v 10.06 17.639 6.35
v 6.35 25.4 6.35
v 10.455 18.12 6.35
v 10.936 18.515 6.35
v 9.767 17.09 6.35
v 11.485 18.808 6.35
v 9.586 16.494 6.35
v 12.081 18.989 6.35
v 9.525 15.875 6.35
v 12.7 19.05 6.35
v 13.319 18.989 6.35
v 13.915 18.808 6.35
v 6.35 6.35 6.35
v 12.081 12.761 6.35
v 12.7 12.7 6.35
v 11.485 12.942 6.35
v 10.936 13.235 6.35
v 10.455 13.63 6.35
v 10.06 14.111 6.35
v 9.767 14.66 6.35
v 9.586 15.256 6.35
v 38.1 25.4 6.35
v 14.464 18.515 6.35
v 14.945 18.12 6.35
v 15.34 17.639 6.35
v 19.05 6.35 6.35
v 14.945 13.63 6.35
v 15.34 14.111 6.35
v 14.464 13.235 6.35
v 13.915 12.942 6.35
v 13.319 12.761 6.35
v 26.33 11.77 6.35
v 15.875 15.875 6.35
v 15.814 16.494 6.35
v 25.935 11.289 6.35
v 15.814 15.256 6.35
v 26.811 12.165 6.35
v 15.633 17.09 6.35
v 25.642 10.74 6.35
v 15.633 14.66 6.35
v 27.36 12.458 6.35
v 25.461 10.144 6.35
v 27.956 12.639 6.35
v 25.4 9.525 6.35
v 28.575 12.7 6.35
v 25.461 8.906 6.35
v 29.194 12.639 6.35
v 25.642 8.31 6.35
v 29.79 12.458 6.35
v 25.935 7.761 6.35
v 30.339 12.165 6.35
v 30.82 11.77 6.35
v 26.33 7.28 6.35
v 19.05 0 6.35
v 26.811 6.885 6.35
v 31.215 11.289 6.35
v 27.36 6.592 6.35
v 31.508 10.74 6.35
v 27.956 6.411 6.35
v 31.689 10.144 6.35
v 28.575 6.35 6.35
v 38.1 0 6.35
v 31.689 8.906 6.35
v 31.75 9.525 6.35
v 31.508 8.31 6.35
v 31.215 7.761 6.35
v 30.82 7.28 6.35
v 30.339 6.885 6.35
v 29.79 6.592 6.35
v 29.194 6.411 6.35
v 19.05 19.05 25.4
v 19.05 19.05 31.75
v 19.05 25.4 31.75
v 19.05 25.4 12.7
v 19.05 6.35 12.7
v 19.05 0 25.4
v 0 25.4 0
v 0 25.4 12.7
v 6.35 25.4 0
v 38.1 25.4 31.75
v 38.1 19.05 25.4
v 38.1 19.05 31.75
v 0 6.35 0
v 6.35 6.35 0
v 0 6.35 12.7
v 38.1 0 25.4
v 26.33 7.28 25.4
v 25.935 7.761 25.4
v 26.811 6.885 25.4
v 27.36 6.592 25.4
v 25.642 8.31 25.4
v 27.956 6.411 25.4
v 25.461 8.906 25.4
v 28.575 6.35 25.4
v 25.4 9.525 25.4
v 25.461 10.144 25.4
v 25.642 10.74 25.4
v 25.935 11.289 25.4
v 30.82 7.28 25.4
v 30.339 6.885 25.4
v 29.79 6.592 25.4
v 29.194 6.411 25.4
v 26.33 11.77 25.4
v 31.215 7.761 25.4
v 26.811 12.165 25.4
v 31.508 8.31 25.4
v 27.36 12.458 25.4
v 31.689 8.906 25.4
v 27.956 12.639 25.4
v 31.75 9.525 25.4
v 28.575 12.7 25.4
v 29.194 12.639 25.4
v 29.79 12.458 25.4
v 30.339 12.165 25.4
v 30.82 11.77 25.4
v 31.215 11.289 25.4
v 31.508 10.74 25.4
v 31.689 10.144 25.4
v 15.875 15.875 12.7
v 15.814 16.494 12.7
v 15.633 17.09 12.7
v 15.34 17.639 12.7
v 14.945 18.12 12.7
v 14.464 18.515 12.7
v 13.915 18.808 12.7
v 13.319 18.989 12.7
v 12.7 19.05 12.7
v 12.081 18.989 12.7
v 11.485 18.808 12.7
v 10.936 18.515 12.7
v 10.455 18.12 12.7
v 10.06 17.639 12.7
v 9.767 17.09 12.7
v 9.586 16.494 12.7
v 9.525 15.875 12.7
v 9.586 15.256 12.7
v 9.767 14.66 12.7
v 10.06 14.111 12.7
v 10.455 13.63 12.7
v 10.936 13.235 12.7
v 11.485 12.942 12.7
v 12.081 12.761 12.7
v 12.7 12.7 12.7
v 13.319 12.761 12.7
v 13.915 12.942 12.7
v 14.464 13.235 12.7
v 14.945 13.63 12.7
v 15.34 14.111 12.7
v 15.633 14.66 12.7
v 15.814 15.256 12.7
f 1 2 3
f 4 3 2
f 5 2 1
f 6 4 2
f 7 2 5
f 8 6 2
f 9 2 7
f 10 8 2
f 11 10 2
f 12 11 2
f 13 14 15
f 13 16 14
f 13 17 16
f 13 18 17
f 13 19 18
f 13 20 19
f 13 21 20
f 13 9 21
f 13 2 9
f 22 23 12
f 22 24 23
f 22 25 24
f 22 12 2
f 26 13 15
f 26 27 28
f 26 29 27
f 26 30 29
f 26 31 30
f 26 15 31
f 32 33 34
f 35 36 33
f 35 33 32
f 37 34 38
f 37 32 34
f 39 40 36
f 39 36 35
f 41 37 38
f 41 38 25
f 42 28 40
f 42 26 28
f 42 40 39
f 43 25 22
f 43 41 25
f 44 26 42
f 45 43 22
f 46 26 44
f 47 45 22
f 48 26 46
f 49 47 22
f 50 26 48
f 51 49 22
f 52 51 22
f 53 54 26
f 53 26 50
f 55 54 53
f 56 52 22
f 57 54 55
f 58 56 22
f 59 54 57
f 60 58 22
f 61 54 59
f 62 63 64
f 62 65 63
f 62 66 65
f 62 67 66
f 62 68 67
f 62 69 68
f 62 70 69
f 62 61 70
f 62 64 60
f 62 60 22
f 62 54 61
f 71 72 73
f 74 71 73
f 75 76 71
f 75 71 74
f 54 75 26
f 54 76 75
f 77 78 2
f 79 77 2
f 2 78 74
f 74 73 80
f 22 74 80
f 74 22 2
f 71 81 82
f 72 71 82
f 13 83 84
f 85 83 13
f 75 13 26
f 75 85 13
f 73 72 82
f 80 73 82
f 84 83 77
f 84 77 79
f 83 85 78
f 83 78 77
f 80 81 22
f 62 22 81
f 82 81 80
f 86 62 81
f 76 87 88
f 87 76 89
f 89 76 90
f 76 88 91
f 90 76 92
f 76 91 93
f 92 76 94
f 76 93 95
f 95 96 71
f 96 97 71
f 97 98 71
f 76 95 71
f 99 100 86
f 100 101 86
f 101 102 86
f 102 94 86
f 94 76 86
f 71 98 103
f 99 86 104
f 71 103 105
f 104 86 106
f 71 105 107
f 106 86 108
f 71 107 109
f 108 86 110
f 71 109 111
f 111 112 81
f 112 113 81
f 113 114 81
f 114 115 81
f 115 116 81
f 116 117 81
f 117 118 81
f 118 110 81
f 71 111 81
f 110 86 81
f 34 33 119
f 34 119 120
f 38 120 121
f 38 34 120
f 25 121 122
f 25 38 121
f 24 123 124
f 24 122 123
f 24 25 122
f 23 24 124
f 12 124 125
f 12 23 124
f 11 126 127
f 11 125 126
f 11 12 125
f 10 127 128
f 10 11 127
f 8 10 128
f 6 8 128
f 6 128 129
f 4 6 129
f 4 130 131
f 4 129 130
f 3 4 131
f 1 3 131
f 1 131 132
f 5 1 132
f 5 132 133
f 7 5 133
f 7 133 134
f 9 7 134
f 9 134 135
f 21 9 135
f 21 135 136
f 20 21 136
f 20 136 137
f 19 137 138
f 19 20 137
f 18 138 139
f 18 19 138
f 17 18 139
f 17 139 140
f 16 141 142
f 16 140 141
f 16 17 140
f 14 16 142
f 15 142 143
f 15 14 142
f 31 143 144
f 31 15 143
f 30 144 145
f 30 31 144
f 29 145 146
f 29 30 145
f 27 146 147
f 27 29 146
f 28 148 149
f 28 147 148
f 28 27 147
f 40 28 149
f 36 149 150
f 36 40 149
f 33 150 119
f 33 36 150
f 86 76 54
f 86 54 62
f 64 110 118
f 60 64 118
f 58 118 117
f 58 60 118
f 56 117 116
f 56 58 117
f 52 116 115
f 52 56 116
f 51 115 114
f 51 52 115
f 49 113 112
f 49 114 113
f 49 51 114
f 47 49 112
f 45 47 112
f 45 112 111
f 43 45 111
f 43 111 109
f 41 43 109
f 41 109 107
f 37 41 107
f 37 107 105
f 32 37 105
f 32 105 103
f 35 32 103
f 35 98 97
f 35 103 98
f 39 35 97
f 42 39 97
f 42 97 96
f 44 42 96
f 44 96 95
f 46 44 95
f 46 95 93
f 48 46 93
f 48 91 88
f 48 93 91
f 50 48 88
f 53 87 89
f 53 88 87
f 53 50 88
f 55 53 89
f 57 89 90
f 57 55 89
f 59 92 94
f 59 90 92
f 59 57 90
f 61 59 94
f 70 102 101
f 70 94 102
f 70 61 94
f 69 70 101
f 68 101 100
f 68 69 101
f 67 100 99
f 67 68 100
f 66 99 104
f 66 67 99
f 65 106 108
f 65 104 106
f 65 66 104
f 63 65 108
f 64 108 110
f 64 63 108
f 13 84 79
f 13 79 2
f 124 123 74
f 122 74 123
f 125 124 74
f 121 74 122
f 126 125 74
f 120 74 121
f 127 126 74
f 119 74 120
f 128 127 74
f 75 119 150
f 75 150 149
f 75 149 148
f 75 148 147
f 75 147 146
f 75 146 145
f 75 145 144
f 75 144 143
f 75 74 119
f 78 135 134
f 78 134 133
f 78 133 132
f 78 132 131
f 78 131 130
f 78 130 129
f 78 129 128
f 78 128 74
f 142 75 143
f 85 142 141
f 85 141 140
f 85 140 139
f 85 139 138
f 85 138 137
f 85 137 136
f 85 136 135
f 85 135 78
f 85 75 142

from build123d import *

# Parameters (mm, degrees)
F0_W     = 19.05
F0_H     = 6.35
F1_DEPTH = 25.4
F2_START = -6.35
F2_DEPTH = 19.05
F4_W     = 19.05
F4_H     = 6.35
F5_DEPTH = 38.101
F6_R     = 3.175
F7_DEPTH = 31.751


with BuildPart() as f1:
    # F0 (on Front) → F1 (new body)
    with BuildSketch(Plane.XZ):
        with Locations((28.575, 28.575)):
            Rectangle(F0_W, F0_H)
        Polygon((19.05, 25.4), (19.05, 12.7), (19.05, 6.35), (38.1, 6.35), (38.1, 25.4), align=None)
    extrude(amount=-F1_DEPTH)

    # F0 (on Front) → F2 (join)
    with BuildSketch(Plane.XZ.offset(F2_START)):
        Polygon((0, 12.7), (0, 0), (6.35, 0), (6.35, 6.35), (19.05, 6.35), (19.05, 12.7), align=None)
    extrude(amount=-F2_DEPTH)

    # F4 (on face) → F5 (cut, through all)
    with BuildSketch(Plane.YZ.offset(38.1)):
        with Locations((9.525, 28.575)):
            Rectangle(F4_W, F4_H)
    extrude(amount=-F5_DEPTH, mode=Mode.SUBTRACT)

    # F6 (on Top) → F7 (cut, through all)
    with BuildSketch(Plane.XY):
        with Locations((12.7, 15.875)):
            Circle(F6_R)
        with Locations((28.575, 9.525)):
            Circle(F6_R)
    extrude(amount=F7_DEPTH, mode=Mode.SUBTRACT)


solid = f1.part
